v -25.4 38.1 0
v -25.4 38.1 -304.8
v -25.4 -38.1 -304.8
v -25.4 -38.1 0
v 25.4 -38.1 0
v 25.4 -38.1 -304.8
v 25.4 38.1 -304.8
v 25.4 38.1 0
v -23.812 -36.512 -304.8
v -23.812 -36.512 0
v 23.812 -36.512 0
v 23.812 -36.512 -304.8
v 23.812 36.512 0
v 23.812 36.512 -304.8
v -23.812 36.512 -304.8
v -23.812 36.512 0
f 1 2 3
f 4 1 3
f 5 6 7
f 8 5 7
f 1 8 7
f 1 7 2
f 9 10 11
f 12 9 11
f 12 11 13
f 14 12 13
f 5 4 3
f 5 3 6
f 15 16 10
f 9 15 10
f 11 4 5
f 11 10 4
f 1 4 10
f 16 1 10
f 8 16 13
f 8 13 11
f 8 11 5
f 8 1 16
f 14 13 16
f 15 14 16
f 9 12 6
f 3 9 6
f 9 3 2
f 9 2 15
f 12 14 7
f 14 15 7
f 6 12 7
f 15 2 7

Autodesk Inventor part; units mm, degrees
ref_plane "YZ Plane" through (0, 0, 0) normal (1, 0, 0) x (0, 1, 0)
ref_plane "XZ Plane" through (0, 0, 0) normal (0, 1, 0) x (-1, 0, 0)
ref_plane "XY Plane" through (0, 0, 0) normal (0, 0, 1) x (1, 0, 0)
sketch "Sketch1" plane through (0, 0, 0) normal (0, 0, 1) x (1, 0, 0)
  line L0 (-25.4, -38.1) -> (25.4, -38.1)
  line L1 (25.4, -38.1) -> (25.4, 38.1)
  line L2 (25.4, 38.1) -> (-25.4, 38.1)
  line L3 (-25.4, 38.1) -> (-25.4, -38.1)
  line L4 (-25.4, -38.1) -> (25.4, 38.1) construction
  line L5 (25.4, -38.1) -> (-25.4, 38.1) construction
  line L6 (-23.8125, -36.5125) -> (23.8125, -36.5125)
  line L7 (23.8125, -36.5125) -> (23.8125, 36.5125)
  line L8 (23.8125, 36.5125) -> (-23.8125, 36.5125)
  line L9 (-23.8125, 36.5125) -> (-23.8125, -36.5125)
  line L10 (-23.8125, -36.5125) -> (23.8125, 36.5125) construction
  line L11 (23.8125, -36.5125) -> (-23.8125, 36.5125) construction
  point P0 (0, 0)
  dimension "d0" = 50.8
  dimension "d1" = 76.2
  dimension "d2" = 1.5875
  dimension "d3" = 1.5875
extrude "Extrusion1" add sketch "Sketch1" against normal blind 304.8
properties part number "2x3x1_16_rectangularTubing" material "Aluminum 6061"
